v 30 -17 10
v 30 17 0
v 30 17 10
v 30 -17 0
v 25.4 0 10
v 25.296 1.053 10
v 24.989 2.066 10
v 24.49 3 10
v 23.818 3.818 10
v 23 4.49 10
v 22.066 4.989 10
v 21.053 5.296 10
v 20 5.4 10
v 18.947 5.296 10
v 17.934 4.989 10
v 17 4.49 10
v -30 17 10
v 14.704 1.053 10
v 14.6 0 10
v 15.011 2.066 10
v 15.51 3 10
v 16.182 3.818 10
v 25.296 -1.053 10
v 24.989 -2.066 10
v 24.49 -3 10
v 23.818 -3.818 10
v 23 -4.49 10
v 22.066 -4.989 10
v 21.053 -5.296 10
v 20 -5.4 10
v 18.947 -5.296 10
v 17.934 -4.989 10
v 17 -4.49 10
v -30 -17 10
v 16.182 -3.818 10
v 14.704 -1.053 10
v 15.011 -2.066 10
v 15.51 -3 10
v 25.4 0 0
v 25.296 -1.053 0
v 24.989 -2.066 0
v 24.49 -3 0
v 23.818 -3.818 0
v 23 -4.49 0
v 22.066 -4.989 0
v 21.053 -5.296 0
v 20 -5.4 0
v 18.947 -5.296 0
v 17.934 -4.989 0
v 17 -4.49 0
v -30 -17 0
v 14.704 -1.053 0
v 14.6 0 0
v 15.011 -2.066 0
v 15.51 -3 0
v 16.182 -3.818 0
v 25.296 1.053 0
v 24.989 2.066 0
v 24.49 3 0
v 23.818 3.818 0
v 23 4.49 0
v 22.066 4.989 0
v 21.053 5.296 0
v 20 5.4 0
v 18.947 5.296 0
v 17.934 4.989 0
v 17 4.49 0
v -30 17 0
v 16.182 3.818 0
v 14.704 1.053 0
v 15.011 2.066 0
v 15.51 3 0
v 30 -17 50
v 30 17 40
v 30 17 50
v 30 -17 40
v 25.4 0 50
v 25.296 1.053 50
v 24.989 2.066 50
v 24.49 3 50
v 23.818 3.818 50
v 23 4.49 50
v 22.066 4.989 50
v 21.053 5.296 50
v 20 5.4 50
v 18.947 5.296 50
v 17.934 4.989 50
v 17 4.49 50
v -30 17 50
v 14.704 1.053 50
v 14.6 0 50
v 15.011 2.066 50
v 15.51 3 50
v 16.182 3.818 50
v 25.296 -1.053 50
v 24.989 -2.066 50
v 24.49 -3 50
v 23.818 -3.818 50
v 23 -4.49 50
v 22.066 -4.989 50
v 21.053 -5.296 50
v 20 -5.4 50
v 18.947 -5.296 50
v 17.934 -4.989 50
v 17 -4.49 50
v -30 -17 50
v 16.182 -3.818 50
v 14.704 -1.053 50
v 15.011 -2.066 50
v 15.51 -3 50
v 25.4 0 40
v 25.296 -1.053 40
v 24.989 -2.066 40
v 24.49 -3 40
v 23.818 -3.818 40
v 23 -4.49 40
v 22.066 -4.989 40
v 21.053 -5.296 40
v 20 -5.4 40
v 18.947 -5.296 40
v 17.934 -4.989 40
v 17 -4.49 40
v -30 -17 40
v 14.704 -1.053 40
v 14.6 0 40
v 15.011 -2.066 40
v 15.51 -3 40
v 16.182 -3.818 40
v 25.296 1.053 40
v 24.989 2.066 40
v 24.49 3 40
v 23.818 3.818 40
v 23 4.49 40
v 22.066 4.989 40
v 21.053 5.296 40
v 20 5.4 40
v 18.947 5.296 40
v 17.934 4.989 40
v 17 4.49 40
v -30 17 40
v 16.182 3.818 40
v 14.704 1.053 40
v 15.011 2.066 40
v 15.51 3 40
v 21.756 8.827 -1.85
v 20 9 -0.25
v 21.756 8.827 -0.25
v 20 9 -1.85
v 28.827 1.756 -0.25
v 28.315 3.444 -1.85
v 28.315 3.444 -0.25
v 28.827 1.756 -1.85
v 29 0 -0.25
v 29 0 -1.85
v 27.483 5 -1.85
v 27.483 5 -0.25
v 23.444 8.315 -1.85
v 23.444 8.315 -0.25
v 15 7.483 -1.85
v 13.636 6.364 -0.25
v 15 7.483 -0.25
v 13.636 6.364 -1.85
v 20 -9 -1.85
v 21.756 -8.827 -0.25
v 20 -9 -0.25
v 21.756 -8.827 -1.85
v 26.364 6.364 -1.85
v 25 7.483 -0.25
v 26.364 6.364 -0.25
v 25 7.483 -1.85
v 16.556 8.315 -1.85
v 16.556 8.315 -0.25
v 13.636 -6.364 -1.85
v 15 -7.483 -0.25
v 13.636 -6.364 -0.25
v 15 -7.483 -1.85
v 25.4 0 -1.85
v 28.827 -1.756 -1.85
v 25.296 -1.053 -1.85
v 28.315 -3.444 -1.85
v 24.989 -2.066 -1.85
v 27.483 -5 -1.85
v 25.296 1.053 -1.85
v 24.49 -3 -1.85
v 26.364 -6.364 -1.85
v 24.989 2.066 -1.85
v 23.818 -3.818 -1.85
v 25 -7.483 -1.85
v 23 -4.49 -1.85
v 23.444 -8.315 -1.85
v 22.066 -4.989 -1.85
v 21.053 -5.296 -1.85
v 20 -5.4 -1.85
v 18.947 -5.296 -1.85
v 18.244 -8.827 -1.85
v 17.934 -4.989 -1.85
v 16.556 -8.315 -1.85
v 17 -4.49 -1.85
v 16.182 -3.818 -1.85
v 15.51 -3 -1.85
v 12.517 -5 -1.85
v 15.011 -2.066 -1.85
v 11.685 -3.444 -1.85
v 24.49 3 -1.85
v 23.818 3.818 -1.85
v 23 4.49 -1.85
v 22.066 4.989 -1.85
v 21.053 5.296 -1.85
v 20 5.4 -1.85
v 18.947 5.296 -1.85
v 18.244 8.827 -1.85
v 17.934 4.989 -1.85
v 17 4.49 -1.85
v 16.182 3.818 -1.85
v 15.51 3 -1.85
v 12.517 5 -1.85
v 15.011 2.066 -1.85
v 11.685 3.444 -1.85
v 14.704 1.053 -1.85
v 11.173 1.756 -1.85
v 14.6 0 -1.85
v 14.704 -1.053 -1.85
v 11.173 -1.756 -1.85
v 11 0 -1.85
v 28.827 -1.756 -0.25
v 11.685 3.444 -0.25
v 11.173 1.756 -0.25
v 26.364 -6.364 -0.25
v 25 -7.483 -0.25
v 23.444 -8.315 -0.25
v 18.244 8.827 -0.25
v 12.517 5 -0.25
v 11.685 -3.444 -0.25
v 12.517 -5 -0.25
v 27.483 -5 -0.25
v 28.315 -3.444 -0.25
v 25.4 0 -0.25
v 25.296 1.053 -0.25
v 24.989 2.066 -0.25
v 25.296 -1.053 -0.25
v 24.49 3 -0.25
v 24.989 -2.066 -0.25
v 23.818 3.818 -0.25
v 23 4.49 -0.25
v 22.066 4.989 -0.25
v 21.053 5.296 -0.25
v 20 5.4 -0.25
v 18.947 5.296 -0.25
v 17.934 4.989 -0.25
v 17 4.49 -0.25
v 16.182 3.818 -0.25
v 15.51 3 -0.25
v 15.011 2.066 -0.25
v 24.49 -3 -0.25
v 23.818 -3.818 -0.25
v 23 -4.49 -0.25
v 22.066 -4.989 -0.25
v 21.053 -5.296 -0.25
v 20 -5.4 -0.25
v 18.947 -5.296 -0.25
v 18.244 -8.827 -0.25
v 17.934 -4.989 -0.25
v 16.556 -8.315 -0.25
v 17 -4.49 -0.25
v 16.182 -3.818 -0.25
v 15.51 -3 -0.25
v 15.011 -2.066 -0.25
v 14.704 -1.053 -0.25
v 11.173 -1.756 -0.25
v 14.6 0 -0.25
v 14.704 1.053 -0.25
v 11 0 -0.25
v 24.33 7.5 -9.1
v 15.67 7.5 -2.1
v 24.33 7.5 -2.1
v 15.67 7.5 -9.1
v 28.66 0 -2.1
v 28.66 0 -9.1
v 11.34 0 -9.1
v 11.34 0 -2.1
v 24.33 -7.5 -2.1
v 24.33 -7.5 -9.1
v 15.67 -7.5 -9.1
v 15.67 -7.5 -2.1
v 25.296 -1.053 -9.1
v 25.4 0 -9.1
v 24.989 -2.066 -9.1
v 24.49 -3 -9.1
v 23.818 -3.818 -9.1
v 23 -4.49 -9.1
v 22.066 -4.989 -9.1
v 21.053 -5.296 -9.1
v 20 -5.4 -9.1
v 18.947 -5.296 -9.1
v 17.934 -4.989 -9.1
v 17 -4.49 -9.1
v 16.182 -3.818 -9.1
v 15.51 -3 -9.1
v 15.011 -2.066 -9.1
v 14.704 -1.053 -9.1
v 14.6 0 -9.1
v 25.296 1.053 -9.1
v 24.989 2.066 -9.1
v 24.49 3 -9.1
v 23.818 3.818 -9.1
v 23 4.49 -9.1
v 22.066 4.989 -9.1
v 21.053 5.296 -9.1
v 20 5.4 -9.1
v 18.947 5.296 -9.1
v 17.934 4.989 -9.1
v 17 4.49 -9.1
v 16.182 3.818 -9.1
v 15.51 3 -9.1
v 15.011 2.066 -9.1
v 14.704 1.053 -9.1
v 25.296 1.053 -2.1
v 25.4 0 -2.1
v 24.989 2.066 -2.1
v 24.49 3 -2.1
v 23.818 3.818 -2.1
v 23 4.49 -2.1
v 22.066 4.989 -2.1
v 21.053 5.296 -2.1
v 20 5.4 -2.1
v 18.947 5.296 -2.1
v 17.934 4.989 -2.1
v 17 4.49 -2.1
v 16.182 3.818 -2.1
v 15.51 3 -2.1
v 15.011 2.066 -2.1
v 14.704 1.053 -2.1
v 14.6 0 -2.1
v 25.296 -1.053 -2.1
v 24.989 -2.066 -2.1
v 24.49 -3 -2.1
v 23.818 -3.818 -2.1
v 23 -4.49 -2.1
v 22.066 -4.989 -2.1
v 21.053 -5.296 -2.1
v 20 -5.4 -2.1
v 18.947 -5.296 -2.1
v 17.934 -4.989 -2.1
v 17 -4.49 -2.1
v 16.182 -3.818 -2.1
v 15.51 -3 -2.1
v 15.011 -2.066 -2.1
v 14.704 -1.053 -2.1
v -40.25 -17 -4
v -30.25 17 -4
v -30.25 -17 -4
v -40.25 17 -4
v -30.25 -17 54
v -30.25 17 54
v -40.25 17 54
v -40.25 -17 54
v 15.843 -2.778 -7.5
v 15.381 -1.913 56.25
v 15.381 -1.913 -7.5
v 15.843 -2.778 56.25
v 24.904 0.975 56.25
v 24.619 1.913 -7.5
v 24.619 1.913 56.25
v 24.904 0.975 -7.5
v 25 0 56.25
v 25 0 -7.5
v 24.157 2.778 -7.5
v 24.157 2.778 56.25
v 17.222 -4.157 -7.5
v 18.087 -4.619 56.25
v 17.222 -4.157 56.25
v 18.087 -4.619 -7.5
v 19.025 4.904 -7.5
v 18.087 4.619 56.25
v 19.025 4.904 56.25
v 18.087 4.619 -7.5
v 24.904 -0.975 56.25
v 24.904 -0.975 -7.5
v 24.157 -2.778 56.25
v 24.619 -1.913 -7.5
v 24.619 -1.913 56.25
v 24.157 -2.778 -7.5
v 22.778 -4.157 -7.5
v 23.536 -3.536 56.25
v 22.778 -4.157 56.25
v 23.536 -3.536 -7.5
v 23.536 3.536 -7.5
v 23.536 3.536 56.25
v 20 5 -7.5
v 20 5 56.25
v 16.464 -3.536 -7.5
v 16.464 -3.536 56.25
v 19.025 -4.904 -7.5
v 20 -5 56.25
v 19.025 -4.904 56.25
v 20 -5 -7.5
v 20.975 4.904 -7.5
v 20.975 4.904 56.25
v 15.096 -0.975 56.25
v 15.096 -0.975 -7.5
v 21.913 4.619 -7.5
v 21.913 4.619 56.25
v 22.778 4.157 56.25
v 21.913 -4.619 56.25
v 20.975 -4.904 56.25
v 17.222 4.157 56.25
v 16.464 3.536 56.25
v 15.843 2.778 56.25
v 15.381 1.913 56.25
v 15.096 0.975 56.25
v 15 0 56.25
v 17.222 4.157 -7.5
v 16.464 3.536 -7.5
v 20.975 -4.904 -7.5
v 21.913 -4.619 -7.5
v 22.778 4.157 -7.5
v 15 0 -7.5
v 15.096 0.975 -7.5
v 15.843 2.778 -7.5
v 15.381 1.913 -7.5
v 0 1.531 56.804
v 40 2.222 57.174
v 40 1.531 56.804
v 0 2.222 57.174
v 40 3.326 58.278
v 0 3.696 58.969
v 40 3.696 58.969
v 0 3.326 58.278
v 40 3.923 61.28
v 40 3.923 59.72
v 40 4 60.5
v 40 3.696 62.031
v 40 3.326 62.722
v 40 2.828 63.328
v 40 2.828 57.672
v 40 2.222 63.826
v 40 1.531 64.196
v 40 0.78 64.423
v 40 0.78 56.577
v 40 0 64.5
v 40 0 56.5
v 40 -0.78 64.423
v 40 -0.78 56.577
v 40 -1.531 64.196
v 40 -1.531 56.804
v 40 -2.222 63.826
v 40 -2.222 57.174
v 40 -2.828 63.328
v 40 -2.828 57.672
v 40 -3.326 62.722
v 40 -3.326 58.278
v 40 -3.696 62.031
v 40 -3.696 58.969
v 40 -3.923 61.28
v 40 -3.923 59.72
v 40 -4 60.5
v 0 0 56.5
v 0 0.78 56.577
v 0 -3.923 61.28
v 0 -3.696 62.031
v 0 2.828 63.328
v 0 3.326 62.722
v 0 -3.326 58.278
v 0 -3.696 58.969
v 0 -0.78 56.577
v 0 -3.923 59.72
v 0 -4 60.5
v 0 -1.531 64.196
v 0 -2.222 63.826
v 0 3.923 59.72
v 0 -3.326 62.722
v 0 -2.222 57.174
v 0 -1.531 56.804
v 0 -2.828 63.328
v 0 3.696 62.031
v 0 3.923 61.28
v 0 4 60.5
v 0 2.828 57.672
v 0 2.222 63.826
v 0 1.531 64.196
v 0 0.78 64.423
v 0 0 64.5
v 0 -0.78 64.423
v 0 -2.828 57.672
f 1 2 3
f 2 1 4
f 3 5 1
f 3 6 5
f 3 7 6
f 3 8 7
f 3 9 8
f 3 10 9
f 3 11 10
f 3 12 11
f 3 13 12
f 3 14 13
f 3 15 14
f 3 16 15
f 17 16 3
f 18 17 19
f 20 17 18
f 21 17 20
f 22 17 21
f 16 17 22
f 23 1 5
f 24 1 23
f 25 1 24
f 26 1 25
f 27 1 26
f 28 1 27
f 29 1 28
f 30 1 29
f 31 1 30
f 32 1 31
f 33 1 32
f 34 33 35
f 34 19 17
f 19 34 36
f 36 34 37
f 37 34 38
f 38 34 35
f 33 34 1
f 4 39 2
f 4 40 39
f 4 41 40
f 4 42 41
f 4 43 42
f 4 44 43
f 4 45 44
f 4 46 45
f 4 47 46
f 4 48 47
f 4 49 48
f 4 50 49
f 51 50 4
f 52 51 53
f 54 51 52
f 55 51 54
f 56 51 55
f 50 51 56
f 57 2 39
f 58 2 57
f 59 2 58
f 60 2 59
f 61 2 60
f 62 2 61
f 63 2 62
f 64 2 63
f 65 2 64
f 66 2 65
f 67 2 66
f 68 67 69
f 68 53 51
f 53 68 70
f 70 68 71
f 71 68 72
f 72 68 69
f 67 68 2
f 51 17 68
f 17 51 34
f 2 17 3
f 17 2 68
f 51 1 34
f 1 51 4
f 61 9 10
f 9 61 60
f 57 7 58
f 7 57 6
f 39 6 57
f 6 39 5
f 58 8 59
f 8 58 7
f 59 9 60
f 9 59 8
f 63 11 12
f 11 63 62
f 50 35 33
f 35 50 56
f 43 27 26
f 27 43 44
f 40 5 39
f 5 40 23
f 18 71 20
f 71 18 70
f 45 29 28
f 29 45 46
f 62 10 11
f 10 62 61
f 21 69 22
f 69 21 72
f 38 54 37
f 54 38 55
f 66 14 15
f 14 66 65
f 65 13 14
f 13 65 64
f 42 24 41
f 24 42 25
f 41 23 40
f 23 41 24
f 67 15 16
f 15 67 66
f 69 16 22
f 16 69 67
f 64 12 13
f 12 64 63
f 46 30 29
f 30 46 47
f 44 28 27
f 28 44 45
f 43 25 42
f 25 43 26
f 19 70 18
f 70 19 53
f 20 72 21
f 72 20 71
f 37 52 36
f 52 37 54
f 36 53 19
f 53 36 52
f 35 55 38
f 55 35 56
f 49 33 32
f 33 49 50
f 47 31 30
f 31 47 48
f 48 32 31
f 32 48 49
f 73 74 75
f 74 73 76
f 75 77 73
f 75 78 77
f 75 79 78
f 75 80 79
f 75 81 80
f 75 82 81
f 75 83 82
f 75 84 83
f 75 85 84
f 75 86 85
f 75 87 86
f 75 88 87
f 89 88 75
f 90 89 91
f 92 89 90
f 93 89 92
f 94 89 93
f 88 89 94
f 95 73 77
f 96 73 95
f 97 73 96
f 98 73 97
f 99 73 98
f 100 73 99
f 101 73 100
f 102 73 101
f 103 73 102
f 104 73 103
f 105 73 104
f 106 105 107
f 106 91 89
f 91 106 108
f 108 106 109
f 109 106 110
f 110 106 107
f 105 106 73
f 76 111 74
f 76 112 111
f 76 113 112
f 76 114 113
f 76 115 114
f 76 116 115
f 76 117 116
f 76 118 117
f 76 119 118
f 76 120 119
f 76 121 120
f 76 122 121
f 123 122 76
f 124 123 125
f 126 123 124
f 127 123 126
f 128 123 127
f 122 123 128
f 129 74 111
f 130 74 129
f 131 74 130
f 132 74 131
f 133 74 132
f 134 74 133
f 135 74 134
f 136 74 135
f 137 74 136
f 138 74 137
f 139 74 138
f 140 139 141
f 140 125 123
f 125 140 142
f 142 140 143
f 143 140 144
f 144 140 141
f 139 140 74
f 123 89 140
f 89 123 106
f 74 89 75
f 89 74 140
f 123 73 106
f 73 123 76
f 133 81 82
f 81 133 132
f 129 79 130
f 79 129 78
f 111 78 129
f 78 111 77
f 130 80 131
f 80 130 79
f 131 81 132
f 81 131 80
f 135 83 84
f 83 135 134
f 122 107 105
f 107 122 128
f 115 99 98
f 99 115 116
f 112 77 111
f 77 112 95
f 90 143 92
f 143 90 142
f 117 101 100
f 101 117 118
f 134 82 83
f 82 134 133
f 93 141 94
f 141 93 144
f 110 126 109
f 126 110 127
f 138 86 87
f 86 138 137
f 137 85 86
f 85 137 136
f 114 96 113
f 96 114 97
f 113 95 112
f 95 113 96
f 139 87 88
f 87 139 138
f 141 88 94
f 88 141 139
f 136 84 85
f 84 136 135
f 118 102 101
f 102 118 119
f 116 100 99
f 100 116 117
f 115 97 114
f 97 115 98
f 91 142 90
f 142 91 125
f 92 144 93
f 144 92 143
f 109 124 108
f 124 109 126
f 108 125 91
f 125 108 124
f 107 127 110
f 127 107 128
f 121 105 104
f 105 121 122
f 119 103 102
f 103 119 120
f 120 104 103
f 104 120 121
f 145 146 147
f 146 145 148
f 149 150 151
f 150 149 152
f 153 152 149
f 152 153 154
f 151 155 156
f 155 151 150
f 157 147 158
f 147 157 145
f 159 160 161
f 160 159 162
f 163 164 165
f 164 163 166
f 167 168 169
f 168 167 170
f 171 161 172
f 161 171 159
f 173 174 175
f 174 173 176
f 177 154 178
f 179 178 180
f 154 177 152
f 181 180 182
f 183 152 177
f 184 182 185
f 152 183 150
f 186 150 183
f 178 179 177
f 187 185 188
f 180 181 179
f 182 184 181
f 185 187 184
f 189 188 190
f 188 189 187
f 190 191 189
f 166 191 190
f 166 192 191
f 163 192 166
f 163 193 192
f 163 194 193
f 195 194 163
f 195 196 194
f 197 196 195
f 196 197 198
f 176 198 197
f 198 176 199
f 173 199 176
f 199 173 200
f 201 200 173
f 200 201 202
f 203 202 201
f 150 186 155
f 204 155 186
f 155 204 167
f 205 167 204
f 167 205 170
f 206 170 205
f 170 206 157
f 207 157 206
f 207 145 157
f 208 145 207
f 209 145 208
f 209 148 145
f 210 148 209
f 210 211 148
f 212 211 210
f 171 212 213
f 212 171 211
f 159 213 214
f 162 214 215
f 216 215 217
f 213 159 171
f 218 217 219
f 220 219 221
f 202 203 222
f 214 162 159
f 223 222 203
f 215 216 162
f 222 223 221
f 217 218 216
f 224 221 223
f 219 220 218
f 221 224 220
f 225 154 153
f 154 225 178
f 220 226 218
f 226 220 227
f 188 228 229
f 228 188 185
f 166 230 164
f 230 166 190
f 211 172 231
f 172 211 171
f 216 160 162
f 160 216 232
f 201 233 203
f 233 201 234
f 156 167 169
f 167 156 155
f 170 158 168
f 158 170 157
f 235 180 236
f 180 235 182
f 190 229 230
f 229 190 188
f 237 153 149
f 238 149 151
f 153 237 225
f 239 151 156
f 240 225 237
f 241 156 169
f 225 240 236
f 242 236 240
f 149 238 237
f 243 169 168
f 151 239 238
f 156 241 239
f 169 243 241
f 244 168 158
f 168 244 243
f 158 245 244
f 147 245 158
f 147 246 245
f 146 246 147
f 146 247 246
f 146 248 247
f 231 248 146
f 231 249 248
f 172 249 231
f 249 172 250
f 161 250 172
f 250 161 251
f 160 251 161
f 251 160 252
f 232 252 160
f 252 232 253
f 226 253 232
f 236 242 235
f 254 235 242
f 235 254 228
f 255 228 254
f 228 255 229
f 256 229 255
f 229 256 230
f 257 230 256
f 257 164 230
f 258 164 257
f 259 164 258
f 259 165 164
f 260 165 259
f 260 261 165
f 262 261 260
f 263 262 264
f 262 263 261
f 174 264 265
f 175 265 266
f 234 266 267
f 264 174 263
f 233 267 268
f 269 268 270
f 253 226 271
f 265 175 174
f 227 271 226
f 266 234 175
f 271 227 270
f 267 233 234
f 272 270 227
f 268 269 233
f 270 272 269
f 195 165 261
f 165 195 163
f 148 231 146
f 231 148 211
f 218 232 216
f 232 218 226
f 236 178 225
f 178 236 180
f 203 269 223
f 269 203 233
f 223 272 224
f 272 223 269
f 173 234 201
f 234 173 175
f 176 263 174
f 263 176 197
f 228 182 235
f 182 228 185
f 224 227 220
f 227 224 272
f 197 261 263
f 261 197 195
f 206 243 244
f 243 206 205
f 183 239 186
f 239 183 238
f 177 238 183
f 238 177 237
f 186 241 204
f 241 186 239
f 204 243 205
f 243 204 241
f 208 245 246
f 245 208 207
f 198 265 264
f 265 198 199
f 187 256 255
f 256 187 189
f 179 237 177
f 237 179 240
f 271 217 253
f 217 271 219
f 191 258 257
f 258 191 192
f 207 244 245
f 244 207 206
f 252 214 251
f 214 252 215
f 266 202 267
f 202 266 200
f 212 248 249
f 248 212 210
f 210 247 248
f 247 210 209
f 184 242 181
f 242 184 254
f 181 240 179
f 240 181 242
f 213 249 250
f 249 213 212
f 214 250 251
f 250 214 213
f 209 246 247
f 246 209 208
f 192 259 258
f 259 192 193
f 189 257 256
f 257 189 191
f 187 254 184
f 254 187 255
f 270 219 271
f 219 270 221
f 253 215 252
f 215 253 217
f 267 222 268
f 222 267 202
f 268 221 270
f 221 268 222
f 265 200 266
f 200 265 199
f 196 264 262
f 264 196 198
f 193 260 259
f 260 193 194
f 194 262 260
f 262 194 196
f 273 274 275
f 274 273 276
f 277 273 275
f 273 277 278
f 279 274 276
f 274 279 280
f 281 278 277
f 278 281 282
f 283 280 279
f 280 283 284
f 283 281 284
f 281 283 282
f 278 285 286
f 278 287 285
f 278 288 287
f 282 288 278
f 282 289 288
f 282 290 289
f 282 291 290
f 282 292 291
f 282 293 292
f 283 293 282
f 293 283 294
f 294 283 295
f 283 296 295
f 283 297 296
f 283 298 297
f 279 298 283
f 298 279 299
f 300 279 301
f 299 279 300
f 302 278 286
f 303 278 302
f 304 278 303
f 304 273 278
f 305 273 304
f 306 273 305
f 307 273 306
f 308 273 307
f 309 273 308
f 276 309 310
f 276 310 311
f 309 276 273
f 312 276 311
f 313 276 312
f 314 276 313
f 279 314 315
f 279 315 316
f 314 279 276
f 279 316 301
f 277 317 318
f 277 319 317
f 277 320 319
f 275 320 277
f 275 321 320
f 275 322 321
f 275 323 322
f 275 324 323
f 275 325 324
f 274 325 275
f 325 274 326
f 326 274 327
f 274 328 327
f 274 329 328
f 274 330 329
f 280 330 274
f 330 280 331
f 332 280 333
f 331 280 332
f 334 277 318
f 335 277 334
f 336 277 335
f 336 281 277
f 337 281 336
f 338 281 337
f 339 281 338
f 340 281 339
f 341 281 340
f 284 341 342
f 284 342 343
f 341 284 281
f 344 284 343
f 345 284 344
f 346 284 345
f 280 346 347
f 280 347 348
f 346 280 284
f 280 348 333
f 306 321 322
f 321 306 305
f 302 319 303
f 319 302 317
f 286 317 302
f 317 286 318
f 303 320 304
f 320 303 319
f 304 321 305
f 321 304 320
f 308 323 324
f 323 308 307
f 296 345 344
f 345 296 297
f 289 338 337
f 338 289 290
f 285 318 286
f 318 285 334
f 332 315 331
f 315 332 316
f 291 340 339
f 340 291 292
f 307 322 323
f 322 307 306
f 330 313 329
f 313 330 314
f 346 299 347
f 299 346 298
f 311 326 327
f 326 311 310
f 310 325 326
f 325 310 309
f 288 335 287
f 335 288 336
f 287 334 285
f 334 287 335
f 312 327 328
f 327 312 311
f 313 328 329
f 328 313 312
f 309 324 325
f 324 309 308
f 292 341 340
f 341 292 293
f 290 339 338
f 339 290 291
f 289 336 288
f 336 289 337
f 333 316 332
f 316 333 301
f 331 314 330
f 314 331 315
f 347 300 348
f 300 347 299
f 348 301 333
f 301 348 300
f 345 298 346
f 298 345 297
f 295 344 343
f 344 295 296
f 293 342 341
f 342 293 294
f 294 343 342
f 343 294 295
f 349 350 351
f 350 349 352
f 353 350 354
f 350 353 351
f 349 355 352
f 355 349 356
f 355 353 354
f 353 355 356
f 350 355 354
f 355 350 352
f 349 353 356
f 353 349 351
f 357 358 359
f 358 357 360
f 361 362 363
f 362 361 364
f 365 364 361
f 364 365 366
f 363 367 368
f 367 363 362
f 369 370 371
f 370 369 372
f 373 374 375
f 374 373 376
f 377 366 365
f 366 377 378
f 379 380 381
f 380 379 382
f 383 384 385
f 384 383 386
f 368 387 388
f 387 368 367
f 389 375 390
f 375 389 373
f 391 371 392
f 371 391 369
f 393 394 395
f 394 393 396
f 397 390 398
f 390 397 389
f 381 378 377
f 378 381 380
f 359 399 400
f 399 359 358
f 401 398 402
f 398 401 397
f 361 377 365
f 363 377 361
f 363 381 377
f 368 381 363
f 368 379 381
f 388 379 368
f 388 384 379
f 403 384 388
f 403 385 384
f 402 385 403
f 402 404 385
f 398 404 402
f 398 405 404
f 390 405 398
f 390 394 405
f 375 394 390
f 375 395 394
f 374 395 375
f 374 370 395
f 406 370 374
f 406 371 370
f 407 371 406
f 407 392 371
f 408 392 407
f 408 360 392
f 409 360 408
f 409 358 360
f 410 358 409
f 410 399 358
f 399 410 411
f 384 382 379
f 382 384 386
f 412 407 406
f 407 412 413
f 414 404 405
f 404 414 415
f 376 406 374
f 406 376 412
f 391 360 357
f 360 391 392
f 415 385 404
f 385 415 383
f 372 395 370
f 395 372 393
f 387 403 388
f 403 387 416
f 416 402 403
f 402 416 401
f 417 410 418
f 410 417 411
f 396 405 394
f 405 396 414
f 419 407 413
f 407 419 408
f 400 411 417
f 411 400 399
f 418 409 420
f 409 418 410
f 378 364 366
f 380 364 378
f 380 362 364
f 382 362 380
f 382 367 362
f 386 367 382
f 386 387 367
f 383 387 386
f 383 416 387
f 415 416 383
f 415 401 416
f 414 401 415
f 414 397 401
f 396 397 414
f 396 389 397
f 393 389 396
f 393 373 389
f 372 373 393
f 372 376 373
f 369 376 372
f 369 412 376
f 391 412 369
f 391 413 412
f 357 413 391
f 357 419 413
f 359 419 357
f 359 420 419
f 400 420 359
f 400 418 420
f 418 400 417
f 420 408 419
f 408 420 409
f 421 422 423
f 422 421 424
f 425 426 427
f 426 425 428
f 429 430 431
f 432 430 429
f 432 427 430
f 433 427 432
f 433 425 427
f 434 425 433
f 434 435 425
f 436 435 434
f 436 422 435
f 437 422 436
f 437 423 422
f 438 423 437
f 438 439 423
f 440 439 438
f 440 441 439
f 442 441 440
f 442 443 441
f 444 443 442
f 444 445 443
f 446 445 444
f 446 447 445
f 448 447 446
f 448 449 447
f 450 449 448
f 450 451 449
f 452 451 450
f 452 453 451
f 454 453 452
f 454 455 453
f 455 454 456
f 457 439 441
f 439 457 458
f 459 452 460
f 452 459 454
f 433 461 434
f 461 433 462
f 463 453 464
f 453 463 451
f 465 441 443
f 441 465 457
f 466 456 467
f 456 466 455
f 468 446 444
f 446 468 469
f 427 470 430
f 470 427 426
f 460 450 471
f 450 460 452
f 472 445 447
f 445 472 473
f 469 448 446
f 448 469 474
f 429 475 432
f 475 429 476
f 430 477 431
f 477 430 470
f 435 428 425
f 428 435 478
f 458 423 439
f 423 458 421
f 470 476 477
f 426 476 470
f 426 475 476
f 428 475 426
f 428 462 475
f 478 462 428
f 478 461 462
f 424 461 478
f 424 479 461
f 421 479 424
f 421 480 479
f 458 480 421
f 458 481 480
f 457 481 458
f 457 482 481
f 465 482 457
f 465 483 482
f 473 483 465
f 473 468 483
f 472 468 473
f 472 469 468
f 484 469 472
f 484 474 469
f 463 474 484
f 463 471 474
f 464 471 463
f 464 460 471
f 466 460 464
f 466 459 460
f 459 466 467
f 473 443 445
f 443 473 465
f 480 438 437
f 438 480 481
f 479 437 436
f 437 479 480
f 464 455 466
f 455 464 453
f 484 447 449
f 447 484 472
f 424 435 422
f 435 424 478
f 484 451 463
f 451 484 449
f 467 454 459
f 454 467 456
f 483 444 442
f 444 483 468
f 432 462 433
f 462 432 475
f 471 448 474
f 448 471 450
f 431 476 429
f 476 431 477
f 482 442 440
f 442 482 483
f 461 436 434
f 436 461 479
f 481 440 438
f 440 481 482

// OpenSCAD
$fn = 32;

// ------------------------------------------------------------------------
// C clamp: throat 40 mm, screw d10
// Every part is its own module, assembly() places every instance.
// ------------------------------------------------------------------------

// --- part 1 ---
module clamp_arm() {
  difference() {
    translate([-30, -17, 0]) cube([60, 34, 10]);
    translate([20, 0, -1]) cylinder(h = 12, d = 10.8);
  }
}

// --- part 2 ---
module clamp_spine() {
  difference() {
    translate([-29, -17, 0]) cube([58, 34, 10]);
  }
}

// --- part 3 ---
module clamp_screw() {
  translate([0, 0, -31.875]) cylinder(h = 63.75, d = 10);
}

// --- part 4 ---
module clamp_washer() {
  difference() {
      translate([0, 0, 0]) cylinder(h = 1.6, d = 18);
      translate([0, 0, -1]) cylinder(h = 3.6, d = 10.8);
    }
}

// --- part 5 ---
module clamp_nut() {
  difference() {
    linear_extrude(height = 7) polygon(points = [[8.66, 0], [4.33, 7.5], [-4.33, 7.5], [-8.66, 0], [-4.33, -7.5], [4.33, -7.5]]);
    translate([0, 0, -1]) cylinder(h = 9, d = 10.8);
  }
}

// --- part 6 ---
module tommy_bar() {
  translate([0, 0, -20]) cylinder(h = 40, d = 8);
}

// --- assembly ---
module assembly() {
  color([0.80, 0.24, 0.20]) translate([0, 0, 0]) rotate([0, 0, 0]) clamp_arm();
  color([0.20, 0.45, 0.75]) translate([0, 0, 40]) rotate([0, 0, 0]) clamp_arm();
  color([0.25, 0.62, 0.32]) translate([-40.25, 0, 25]) rotate([0, 90, 0]) clamp_spine();
  color([0.92, 0.70, 0.18]) translate([20, 0, 24.375]) rotate([0, 0, 0]) clamp_screw();
  color([0.58, 0.35, 0.70]) translate([20, 0, -1.85]) rotate([0, 0, 0]) clamp_washer();
  color([0.16, 0.66, 0.66]) translate([20, 0, -9.1]) rotate([0, 0, 0]) clamp_nut();
  color([0.85, 0.48, 0.18]) translate([20, 0, 60.5]) rotate([0, 90, 0]) tommy_bar();
}

assembly();
